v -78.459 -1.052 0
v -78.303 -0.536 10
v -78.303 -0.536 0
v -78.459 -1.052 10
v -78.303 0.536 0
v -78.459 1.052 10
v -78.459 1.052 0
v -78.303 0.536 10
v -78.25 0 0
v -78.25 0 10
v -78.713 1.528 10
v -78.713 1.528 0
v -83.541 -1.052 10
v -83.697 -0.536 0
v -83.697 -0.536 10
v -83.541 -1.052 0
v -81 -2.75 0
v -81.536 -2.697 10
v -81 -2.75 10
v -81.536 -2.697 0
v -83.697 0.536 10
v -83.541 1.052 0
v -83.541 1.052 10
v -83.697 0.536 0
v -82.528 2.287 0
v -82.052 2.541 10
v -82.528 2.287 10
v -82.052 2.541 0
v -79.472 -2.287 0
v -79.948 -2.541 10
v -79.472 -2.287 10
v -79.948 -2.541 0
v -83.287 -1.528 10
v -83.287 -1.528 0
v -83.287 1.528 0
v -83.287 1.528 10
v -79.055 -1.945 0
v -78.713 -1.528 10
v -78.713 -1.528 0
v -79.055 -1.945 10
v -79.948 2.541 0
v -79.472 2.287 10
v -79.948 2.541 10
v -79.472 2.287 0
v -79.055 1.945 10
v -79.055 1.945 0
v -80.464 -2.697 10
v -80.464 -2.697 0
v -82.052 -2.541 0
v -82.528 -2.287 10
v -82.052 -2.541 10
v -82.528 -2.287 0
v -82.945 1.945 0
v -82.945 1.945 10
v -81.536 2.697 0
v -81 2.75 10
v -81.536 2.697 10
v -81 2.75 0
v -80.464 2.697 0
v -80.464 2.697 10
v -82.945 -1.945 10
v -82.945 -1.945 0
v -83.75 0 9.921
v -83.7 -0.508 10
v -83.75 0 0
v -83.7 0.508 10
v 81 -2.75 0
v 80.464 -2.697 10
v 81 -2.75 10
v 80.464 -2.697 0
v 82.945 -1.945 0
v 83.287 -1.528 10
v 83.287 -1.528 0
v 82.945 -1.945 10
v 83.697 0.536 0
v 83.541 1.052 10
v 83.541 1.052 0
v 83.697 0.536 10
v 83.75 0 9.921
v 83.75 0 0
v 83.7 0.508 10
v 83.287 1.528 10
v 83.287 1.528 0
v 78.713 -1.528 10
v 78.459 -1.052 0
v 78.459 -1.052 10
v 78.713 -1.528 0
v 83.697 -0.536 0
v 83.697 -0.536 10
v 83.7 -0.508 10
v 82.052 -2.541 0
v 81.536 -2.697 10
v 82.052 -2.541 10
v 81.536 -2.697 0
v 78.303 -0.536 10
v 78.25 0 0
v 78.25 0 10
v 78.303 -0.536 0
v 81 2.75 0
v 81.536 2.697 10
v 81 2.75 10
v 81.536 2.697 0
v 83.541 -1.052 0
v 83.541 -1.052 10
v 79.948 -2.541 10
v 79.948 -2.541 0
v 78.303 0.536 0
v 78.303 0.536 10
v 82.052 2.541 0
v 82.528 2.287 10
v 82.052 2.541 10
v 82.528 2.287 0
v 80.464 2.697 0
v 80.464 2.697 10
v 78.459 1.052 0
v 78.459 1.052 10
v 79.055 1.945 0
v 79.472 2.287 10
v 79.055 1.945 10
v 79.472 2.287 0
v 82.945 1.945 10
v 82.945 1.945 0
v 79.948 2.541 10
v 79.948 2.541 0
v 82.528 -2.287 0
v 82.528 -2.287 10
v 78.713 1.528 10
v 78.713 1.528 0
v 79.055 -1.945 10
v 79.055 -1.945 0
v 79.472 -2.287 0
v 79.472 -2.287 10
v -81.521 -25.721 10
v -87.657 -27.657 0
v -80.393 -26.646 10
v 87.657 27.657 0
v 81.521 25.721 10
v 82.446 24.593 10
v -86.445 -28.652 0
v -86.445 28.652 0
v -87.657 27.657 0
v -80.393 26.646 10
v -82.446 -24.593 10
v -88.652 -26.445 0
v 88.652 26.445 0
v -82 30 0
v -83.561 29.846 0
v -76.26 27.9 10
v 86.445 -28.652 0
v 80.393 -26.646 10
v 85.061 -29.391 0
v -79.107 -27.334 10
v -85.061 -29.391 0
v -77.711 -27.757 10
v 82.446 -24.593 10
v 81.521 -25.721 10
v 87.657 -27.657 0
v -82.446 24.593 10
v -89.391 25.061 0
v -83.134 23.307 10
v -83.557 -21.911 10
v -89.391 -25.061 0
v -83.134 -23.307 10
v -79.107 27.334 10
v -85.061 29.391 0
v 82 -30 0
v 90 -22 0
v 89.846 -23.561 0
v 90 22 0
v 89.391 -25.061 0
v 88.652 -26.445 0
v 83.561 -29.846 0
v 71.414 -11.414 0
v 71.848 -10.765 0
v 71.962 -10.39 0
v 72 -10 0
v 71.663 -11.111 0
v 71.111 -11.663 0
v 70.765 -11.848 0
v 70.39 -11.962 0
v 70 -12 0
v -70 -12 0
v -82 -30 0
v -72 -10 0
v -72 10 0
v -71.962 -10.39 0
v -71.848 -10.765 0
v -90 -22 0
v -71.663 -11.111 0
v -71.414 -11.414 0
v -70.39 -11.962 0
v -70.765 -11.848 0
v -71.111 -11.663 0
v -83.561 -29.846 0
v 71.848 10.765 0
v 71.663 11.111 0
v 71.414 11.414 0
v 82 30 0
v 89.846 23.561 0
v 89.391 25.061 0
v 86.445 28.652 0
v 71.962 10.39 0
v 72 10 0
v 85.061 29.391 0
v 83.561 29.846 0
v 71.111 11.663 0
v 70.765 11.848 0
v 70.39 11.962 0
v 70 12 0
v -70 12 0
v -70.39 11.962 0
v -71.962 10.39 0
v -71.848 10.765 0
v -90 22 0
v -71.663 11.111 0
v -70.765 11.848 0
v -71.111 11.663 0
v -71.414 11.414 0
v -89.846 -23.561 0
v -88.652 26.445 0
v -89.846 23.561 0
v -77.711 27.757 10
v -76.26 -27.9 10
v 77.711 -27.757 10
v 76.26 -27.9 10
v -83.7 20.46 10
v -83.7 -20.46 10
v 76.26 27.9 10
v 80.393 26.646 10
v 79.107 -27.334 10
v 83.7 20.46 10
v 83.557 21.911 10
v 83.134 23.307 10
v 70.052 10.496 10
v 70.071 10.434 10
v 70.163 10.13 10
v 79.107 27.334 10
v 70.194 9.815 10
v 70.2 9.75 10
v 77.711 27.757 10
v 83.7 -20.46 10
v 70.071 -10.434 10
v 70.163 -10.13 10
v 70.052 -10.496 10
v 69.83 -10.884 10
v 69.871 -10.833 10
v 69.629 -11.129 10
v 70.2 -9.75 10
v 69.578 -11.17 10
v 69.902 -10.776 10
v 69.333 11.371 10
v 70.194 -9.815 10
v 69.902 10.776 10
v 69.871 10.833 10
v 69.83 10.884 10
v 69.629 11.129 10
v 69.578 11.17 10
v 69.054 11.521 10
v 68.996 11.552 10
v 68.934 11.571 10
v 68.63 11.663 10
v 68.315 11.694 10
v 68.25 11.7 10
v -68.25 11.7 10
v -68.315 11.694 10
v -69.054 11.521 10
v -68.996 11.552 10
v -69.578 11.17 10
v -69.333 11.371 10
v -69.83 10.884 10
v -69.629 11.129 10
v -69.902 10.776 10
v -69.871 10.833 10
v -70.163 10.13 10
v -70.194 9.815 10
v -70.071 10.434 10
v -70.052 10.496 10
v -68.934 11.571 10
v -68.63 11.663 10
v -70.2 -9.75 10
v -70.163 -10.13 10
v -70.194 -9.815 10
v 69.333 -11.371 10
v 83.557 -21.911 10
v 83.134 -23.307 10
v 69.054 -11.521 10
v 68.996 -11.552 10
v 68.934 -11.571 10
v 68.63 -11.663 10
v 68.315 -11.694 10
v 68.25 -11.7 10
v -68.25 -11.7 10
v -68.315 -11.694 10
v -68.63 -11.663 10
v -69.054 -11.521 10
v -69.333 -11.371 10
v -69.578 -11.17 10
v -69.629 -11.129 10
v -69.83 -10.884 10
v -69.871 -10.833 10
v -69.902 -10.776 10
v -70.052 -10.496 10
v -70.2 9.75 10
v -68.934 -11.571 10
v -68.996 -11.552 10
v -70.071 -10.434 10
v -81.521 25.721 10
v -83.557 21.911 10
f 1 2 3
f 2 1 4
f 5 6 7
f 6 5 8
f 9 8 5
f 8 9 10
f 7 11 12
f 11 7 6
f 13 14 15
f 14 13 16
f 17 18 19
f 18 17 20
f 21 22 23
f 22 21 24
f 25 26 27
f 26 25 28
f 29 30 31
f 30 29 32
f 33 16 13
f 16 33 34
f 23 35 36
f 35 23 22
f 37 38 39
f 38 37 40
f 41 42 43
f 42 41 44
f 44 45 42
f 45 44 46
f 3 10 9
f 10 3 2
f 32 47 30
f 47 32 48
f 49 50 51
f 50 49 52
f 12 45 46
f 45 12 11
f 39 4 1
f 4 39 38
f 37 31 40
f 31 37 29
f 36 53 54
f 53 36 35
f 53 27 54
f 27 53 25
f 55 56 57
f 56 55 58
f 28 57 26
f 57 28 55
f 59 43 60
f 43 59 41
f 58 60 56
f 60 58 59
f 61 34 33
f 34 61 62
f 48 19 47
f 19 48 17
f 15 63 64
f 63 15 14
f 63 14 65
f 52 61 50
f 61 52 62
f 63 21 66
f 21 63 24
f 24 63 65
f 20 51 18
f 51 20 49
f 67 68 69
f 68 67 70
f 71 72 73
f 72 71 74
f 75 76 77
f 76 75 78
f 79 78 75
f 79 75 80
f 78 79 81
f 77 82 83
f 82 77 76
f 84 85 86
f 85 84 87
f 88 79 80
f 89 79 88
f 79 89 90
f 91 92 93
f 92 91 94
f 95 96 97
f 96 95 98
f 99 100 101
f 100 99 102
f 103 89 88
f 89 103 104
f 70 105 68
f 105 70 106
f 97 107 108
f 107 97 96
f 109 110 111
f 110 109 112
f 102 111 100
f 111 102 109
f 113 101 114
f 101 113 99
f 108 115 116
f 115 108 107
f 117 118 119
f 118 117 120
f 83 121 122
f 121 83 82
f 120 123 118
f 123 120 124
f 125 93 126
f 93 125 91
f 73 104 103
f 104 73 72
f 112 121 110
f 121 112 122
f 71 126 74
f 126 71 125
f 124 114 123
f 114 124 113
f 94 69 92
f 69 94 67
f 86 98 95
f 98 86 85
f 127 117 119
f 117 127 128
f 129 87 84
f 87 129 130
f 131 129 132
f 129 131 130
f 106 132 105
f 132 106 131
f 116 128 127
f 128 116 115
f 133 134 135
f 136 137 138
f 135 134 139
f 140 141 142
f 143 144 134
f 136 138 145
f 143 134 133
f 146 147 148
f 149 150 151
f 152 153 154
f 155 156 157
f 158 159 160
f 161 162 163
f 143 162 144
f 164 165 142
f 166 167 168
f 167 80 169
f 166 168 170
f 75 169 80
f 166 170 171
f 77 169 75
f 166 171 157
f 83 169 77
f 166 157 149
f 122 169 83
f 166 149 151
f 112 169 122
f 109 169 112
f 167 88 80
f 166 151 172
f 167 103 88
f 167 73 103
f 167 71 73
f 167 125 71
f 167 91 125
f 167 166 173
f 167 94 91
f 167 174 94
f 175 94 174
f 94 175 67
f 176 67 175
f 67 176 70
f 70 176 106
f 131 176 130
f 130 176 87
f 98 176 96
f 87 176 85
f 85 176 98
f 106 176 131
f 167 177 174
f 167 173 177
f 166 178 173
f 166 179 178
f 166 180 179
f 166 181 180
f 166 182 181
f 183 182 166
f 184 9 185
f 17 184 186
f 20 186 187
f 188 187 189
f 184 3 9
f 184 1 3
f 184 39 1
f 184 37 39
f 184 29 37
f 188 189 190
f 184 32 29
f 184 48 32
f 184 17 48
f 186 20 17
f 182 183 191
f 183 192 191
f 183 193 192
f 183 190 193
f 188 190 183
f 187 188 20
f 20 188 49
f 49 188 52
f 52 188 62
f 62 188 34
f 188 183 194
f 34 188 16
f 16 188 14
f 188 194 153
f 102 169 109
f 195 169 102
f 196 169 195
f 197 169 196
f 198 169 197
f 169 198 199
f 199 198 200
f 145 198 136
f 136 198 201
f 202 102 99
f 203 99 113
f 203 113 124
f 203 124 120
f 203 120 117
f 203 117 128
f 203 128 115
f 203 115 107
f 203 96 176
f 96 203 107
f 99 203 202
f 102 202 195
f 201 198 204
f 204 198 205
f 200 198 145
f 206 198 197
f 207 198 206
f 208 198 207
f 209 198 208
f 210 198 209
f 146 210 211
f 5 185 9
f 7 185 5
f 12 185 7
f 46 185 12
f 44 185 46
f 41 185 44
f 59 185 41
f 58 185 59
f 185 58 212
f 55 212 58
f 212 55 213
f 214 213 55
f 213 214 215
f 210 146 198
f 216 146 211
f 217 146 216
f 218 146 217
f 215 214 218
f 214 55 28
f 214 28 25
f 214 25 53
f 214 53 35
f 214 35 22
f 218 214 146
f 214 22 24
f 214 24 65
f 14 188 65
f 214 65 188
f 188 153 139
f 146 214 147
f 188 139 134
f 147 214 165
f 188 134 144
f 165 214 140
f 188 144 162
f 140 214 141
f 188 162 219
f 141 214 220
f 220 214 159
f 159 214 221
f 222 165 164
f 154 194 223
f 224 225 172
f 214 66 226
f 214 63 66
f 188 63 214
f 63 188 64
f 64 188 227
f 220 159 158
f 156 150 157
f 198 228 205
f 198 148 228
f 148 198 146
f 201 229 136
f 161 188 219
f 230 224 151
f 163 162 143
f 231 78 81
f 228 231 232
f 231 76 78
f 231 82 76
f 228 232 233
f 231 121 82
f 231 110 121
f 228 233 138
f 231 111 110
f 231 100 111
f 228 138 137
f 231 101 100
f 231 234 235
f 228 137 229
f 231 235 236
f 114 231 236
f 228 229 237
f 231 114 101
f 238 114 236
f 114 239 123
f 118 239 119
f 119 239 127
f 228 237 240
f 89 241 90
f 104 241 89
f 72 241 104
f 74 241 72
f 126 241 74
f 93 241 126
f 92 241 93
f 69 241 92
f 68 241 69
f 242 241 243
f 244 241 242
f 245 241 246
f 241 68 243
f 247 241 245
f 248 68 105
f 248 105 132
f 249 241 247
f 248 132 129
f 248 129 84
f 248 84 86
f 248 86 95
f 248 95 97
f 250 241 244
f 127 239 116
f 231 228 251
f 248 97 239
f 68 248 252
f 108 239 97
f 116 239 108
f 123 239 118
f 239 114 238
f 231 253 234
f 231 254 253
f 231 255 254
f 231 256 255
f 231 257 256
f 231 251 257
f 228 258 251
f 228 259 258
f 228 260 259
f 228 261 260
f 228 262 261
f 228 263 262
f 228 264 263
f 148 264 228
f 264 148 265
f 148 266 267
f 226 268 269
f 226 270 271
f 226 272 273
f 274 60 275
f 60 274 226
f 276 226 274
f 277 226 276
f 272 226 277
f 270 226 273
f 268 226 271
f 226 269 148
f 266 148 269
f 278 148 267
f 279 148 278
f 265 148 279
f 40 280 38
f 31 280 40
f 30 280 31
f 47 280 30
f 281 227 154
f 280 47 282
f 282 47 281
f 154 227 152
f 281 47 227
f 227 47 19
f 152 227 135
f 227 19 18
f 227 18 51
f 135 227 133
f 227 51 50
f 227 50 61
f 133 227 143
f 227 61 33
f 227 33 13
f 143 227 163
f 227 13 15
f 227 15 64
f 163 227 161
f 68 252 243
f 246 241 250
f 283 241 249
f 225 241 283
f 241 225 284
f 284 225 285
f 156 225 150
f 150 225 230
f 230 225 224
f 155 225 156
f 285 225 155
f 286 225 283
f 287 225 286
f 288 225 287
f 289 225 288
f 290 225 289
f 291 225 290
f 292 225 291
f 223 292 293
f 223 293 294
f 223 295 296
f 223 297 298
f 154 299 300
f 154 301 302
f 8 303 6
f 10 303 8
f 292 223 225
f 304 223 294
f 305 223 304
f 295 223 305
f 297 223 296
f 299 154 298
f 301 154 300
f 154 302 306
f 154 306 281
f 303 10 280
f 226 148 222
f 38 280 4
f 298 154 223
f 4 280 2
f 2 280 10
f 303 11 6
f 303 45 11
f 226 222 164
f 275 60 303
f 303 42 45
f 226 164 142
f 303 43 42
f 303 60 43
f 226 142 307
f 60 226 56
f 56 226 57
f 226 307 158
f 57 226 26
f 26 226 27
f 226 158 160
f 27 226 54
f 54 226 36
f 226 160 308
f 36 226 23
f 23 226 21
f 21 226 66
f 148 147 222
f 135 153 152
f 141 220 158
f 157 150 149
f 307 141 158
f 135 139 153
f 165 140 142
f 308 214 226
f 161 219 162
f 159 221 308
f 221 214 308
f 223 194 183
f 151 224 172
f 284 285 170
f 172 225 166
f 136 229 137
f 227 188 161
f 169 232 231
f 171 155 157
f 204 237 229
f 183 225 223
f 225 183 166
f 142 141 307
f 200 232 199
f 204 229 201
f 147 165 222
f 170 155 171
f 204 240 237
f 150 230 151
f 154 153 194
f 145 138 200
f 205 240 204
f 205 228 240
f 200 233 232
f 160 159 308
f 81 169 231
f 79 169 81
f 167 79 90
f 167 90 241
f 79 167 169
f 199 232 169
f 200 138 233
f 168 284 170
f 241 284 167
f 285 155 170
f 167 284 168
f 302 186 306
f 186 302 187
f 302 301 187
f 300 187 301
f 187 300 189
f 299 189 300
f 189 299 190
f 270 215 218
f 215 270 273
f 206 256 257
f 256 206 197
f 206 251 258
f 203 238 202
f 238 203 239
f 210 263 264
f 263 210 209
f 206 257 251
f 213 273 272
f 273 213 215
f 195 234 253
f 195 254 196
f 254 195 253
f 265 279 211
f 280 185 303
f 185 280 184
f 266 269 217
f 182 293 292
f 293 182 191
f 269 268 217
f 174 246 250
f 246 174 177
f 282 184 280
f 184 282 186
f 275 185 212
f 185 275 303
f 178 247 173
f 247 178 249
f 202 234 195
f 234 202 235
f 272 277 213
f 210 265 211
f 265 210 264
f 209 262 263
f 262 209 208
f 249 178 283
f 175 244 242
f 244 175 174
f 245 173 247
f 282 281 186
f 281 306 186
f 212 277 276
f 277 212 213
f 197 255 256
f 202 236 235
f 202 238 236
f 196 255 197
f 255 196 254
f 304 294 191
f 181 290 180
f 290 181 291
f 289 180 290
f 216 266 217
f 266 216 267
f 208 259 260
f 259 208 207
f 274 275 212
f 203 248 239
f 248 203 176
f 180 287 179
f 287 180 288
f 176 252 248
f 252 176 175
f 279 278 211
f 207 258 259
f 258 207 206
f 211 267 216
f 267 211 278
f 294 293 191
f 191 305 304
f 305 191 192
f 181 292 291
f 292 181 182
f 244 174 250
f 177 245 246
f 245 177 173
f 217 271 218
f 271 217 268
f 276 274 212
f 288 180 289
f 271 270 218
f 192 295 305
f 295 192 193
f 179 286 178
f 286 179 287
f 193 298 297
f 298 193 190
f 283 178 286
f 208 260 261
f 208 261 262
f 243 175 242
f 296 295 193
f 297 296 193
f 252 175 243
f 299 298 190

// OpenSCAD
$fn = 32;

// ----------------------------------------------------------------------
// Display bezel: 180 x 60 mm frame, opening 144x24 mm
// ----------------------------------------------------------------------

// --- parameters (mm) ---
length = 180;             // frame outside length, X
width = 60;               // frame outside width, Y
frame_w = 18;             // frame width
thickness = 10;           // frame thickness
corner_r = 8;             // outside corner radius
chamfer = 0.93;           // outer wall taper
funnel = 0.97;            // inner opening taper
opening_l = 144;          // opening length
opening_w = 24;           // opening width
inner_r = 2;              // opening corner radius
hole_d = 5.5;             // mounting screw clearance
holes_per_side = 1;       // holes per short side
hole_inset = 9;           // hole centre inset from the outside edge

/* rounded-rectangle outlines, generated with loops */
module rounded_ring(l_nom, w_nom, r) {
  hull() {
    for (sx = [-1, 1]) for (sy = [-1, 1])
      translate([sx * (l_nom / 2 - r), sy * (w_nom / 2 - r)]) circle(r = r);
  }
}

difference() {
  /* frame body, drafted so the outer edge is a variable-depth chamfer */
  linear_extrude(height = thickness, scale = chamfer)
    rounded_ring(length, width, corner_r);
  /* viewing opening, drafted the other way for a funnel edge */
  linear_extrude(height = thickness + 2, scale = funnel)
    translate([0, 0, -1]) rounded_ring(opening_l, opening_w, inner_r);
  /* mounting screws through the frame lands */
  for (sx = [-1, 1]) for (i = [1 : holes_per_side])
    translate([sx * (length / 2 - hole_inset),
               (i - (holes_per_side + 1) / 2) * width * 0.5, -1])
      cylinder(h = thickness + 2, d = hole_d);
}
